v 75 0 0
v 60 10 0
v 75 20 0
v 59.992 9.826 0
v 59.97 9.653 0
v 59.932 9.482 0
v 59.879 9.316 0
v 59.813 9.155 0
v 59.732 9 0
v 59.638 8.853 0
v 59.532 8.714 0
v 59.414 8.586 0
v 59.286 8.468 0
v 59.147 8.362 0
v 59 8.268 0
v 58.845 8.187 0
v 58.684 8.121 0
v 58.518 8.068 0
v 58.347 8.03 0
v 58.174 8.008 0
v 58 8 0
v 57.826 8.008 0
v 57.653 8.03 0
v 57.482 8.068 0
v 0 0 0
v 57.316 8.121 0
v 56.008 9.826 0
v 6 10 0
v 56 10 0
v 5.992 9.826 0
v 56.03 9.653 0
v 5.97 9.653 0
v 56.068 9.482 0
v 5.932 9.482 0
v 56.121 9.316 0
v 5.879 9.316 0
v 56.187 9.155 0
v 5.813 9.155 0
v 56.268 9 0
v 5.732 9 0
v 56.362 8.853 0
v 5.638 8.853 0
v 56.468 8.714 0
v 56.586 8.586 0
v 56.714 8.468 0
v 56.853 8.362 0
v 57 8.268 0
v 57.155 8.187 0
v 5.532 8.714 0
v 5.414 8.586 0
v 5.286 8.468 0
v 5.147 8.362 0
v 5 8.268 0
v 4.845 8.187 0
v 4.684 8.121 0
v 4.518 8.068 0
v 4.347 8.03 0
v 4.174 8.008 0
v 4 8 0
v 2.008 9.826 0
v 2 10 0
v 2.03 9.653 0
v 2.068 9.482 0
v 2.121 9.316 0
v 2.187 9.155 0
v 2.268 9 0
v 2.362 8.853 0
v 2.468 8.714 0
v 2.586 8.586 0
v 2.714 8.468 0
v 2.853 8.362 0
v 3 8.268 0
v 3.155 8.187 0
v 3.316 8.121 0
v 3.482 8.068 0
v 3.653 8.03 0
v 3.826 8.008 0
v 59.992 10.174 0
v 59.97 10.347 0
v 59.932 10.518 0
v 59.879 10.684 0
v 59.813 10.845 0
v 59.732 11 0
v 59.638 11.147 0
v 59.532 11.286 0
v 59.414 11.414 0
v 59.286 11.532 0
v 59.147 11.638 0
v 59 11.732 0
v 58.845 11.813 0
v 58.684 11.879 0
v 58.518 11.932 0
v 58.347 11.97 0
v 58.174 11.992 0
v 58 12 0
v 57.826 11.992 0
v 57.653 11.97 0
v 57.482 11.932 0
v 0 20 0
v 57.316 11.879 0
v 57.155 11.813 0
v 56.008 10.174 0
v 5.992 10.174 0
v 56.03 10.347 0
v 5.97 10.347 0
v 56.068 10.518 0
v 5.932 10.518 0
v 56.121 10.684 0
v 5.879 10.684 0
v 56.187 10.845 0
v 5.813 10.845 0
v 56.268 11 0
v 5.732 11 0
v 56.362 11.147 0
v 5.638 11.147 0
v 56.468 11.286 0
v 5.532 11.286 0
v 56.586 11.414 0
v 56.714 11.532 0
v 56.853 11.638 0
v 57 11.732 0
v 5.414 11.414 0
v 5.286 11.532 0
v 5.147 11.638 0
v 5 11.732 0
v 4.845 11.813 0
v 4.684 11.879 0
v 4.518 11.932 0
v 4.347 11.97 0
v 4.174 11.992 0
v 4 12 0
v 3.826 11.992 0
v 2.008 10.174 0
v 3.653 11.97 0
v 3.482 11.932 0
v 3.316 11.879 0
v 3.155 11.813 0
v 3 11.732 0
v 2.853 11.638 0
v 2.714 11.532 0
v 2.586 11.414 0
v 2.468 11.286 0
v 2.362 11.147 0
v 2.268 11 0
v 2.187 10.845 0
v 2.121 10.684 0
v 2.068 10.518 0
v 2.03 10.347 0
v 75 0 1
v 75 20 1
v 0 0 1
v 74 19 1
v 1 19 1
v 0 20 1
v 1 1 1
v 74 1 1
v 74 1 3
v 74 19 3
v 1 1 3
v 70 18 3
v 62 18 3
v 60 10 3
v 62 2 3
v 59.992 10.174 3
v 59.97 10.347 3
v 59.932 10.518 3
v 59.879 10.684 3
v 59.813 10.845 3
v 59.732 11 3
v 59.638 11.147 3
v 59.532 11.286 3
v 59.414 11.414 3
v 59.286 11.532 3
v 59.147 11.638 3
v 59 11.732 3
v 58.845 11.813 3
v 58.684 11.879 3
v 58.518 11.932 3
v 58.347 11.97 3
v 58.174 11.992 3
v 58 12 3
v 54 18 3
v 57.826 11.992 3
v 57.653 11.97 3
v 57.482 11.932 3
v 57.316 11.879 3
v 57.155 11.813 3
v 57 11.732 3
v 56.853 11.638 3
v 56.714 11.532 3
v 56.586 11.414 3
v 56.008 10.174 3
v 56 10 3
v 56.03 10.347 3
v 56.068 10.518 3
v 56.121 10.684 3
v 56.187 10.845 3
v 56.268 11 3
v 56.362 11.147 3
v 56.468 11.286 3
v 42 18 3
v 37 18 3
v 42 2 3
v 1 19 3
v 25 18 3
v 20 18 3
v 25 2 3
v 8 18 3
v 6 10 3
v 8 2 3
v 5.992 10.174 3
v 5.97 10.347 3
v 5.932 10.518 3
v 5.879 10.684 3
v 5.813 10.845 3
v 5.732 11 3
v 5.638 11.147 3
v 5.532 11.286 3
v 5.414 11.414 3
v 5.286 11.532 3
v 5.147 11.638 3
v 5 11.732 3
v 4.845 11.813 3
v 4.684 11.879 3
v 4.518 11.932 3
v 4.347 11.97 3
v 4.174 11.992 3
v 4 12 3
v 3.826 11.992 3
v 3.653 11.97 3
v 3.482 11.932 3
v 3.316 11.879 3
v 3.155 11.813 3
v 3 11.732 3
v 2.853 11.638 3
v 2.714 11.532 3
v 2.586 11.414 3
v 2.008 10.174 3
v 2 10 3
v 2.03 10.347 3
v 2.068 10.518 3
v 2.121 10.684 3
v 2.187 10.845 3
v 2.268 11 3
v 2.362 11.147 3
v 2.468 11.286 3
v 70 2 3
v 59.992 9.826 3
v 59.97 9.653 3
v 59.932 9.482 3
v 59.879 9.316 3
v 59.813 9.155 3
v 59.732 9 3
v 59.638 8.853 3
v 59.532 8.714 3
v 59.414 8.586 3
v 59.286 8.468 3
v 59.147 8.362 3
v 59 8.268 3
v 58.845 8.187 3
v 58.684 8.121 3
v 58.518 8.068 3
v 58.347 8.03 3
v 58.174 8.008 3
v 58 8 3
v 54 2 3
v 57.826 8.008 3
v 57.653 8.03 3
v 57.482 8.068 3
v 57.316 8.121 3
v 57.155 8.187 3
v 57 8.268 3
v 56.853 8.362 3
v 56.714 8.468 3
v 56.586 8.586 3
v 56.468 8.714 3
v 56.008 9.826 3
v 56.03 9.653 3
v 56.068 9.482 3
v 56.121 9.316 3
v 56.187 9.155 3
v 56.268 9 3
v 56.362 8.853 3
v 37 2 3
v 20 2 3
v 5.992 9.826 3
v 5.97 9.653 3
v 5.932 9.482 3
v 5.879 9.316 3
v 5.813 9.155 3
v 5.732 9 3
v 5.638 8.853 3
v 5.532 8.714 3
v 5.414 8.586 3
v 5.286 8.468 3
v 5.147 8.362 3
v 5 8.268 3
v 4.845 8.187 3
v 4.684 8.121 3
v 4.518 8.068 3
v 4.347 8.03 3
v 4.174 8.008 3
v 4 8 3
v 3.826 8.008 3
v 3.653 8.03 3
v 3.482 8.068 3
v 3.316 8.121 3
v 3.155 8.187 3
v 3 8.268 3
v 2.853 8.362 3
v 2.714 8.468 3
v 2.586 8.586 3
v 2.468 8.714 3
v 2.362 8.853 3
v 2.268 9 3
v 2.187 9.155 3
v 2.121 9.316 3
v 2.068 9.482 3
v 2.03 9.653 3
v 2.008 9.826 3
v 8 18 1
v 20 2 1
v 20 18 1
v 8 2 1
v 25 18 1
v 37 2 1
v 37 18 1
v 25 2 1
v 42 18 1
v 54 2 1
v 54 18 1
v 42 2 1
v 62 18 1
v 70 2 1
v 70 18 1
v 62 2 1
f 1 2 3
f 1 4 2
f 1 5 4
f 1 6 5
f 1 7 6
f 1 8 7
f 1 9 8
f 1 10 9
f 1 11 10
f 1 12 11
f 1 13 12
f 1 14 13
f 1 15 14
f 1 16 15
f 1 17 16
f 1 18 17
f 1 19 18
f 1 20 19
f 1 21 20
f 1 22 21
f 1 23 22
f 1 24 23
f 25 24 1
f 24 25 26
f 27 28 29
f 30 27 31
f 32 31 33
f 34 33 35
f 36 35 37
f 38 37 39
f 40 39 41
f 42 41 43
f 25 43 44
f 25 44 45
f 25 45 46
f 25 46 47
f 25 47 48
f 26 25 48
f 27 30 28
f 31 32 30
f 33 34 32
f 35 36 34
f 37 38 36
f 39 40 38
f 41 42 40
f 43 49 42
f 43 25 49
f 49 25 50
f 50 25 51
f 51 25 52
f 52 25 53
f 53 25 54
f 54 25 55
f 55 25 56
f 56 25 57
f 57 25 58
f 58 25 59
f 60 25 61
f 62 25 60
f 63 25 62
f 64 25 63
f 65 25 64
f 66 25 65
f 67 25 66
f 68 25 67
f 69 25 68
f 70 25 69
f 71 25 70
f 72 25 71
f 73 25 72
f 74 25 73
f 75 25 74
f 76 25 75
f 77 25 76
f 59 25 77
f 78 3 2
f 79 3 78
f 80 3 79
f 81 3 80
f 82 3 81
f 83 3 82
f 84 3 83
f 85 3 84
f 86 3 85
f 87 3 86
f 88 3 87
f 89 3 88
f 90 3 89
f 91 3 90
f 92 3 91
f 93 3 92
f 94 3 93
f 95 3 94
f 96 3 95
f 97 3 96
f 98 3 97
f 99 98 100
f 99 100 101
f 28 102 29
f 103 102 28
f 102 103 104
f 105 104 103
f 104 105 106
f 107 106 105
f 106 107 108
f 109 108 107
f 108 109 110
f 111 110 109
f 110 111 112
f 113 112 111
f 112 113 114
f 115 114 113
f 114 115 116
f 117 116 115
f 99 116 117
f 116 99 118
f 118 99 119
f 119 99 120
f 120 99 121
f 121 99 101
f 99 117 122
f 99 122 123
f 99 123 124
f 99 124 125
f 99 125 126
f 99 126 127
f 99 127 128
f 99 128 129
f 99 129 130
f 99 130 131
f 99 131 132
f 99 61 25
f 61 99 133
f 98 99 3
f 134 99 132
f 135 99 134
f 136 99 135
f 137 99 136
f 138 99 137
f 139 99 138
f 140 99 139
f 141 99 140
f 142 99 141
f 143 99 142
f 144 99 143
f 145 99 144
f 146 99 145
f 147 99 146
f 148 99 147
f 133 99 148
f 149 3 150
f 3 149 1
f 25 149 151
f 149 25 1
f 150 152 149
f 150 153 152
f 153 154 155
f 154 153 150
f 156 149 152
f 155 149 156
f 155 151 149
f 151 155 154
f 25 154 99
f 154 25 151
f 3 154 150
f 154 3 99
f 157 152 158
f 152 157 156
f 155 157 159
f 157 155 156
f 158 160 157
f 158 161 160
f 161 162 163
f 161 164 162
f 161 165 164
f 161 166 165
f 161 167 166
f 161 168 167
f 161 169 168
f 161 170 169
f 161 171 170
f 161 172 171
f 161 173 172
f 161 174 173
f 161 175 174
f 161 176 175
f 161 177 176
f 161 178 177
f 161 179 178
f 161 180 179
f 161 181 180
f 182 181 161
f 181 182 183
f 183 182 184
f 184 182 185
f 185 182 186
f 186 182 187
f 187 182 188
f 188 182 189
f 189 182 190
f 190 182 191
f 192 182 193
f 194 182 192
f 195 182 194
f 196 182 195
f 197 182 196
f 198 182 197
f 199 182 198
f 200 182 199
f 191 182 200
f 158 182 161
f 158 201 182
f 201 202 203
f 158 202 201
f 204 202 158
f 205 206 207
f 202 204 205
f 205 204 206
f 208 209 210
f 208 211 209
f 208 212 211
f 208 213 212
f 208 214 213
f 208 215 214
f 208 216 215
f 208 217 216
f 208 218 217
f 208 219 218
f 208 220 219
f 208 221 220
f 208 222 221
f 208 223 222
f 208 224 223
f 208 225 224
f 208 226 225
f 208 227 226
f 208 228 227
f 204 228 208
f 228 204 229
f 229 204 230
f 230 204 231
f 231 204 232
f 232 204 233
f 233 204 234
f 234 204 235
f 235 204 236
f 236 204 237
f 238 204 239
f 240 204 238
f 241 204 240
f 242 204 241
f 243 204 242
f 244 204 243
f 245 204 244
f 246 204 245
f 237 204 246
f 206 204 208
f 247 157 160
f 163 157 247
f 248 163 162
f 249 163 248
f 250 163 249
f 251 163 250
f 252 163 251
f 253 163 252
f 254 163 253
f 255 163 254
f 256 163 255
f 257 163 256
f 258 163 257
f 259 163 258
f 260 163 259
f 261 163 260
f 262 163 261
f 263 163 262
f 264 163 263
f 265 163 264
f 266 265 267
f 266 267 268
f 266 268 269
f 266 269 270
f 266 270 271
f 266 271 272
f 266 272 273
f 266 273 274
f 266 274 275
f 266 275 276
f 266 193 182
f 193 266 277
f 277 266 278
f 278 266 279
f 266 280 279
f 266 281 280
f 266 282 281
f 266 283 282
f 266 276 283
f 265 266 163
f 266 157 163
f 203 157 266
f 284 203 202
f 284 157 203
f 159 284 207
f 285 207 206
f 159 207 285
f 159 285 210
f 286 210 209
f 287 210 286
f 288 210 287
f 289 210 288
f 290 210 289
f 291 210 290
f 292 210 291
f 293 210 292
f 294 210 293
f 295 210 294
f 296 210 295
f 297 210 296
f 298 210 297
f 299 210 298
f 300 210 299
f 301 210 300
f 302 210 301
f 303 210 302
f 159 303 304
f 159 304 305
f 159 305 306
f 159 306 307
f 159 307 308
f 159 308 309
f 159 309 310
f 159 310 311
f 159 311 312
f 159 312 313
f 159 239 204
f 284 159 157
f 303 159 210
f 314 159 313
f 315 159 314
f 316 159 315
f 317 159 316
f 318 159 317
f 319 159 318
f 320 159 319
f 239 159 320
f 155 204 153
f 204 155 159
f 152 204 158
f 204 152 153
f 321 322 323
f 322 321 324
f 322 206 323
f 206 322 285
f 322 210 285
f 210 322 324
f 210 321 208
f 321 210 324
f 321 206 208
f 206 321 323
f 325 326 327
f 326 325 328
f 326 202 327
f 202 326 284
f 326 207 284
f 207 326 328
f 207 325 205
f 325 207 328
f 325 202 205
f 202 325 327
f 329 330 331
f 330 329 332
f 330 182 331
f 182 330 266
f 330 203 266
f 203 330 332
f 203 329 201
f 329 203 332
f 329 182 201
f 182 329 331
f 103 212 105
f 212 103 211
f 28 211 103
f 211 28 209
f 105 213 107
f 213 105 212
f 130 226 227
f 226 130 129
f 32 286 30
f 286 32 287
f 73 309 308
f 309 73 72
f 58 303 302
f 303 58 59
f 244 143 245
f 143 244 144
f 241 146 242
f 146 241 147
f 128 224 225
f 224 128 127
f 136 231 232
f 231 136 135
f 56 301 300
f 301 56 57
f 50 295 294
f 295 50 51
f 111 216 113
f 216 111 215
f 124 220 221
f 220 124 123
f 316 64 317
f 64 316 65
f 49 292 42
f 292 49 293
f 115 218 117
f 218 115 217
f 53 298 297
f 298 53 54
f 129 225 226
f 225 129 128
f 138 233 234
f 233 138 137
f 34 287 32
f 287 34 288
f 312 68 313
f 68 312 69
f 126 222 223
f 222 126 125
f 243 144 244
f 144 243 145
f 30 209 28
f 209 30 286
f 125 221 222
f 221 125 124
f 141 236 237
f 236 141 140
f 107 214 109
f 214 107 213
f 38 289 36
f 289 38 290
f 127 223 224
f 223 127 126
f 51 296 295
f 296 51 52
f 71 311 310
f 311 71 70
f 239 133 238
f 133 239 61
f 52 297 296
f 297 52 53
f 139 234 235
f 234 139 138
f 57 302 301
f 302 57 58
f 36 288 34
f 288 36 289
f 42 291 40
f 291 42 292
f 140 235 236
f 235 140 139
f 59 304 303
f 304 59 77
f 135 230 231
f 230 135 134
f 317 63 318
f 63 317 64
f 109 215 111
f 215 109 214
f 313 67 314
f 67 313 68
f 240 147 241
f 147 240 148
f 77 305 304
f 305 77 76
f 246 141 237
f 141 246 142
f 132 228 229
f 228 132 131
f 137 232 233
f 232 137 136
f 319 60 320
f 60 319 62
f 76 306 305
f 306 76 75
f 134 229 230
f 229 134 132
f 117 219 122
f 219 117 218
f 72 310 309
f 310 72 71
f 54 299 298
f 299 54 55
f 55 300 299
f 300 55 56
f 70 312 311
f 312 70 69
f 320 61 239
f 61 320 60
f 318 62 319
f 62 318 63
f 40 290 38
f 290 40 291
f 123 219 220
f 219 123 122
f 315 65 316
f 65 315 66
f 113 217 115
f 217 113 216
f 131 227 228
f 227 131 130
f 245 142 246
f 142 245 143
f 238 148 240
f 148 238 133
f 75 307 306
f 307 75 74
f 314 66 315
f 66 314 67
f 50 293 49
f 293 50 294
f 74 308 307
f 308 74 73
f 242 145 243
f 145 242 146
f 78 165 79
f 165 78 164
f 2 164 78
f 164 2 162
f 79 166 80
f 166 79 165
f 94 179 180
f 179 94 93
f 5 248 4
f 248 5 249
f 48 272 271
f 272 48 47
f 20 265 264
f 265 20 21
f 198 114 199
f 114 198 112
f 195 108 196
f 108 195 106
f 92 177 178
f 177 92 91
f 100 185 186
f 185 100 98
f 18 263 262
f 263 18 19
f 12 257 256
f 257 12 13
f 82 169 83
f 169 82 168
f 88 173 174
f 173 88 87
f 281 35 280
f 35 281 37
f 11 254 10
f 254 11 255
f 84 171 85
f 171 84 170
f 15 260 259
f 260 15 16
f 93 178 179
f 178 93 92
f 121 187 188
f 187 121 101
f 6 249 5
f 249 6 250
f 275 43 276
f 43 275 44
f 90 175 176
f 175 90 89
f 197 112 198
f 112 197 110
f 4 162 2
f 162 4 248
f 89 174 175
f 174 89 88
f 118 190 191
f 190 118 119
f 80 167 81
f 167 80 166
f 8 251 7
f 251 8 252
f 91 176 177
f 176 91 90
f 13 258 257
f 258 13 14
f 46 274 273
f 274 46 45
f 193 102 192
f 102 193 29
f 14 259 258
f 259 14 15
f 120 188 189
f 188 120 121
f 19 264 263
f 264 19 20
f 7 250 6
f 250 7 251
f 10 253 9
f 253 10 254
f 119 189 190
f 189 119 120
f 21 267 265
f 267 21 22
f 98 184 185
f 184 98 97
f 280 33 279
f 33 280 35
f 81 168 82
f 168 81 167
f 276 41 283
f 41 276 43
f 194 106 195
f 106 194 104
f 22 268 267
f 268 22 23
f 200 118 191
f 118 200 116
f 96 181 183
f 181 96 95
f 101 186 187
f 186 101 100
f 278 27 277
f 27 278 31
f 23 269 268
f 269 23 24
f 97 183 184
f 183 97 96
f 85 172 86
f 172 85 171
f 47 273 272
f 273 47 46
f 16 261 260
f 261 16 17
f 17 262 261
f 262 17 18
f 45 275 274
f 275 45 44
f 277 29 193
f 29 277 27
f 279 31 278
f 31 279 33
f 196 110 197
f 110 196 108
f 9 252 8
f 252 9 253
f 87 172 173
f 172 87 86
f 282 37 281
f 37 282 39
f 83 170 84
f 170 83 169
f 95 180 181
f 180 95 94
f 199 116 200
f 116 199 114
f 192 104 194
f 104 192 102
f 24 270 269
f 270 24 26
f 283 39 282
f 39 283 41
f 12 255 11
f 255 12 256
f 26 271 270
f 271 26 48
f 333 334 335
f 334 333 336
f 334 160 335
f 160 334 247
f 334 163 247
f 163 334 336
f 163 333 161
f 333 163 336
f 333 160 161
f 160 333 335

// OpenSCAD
//!OpenSCAD
CAP_THICKNESS = 1;
CASE_THICKNESS = 2;
CASE_THICKNESS_TOP = 2;
CASE_THICKNESS_BOTTOM = 1;

CASE_BOTTOM_WIDTH = 75;
CASE_BOTTOM_DEPTH = 20;
CASE_BOTTOM_HEIGHT = CASE_THICKNESS_BOTTOM;

CASE_TOP_WIDTH = CASE_BOTTOM_WIDTH - 2*CAP_THICKNESS;
CASE_TOP_DEPTH = CASE_BOTTOM_DEPTH - 2* CAP_THICKNESS;
CASE_TOP_HEIGHT = CASE_THICKNESS_TOP;

CASE_WIDTH = CASE_BOTTOM_WIDTH;
CASE_DEPTH = CASE_BOTTOM_DEPTH;
CASE_HEIGHT = CASE_BOTTOM_HEIGHT + CASE_TOP_HEIGHT;

CUTOUT_HEIGHT = CASE_HEIGHT - CASE_THICKNESS_BOTTOM;

CUTOUT_B1_X = 14;
CUTOUT_B1_Y = CASE_DEPTH / 2;
CUTOUT_B1_WIDTH = 12;
CUTOUT_B1_DEPTH = CASE_DEPTH - 2*CASE_THICKNESS;

CUTOUT_B2_X = 31;
CUTOUT_B2_Y = CASE_DEPTH / 2;
CUTOUT_B2_WIDTH = 12;
CUTOUT_B2_DEPTH = CASE_DEPTH - 2*CASE_THICKNESS;

CUTOUT_B3_X = 48;
CUTOUT_B3_Y = CASE_DEPTH / 2;
CUTOUT_B3_WIDTH = 12;
CUTOUT_B3_DEPTH = CASE_DEPTH - 2*CASE_THICKNESS;

CUTOUT_C_X = 66;
CUTOUT_C_Y = CASE_DEPTH / 2;
CUTOUT_C_WIDTH = 8;
CUTOUT_C_DEPTH = CASE_DEPTH - 2*CASE_THICKNESS;

HOLE1_X = 4;
HOLE1_Y = CASE_DEPTH / 2;

HOLE2_X = 58;
HOLE2_Y = CASE_DEPTH / 2;


HOLE_DIAMETER = 4;


module box(x, y, z, w, d, h) {
  translate([x, y, z])
  linear_extrude(height = h)
  polygon(
    [
      [-w/2, -d/2],
      [+w/2, -d/2],
      [-w/2, +d/2],
      [+w/2, +d/2],
    ],
    [
      [0, 1, 3, 2],  
    ]
  );
}

module outer_shape() {
  box(
    CASE_WIDTH/2, CASE_DEPTH/2, 0,
    CASE_BOTTOM_WIDTH, CASE_BOTTOM_DEPTH, CASE_BOTTOM_HEIGHT
  );
  box(
    CASE_WIDTH/2, CASE_DEPTH/2, CASE_BOTTOM_HEIGHT,
    CASE_TOP_WIDTH, CASE_TOP_DEPTH, CASE_TOP_HEIGHT
  );
}

module cutout(x, y, w, d) {
  translate([x, y, CASE_THICKNESS_BOTTOM])
  linear_extrude(height = CUTOUT_HEIGHT)
  polygon(
    [
      [-w/2, -d/2],
      [+w/2, -d/2],
      [-w/2, +d/2],
      [+w/2, +d/2],
    ],
    [
      [0, 1, 3, 2],  
    ]
  );
}

module cutout_buttons() {
  cutout(CUTOUT_B1_X, CUTOUT_B1_Y, CUTOUT_B1_WIDTH, CUTOUT_B1_DEPTH);
  cutout(CUTOUT_B2_X, CUTOUT_B2_Y, CUTOUT_B2_WIDTH, CUTOUT_B2_DEPTH);
  cutout(CUTOUT_B3_X, CUTOUT_B3_Y, CUTOUT_B3_WIDTH, CUTOUT_B3_DEPTH);
}

module cutout_connector() {
  cutout(CUTOUT_C_X, CUTOUT_C_Y, CUTOUT_C_WIDTH, CUTOUT_C_DEPTH);
}

module hole(height) {
  translate([0, 0, height/2]) cylinder(r=HOLE_DIAMETER/2, h=height, center=true, $fn=72);
}

module holes() {
  translate([HOLE1_X, HOLE1_Y, 0]) hole(CASE_HEIGHT);
  translate([HOLE2_X, HOLE1_Y, 0]) hole(CASE_HEIGHT);
}

module case_base() {
    difference() {
        outer_shape();
        cutout_buttons();
        cutout_connector();
        holes();
    }
}

difference() {    
    union() { case_base();  }
}
